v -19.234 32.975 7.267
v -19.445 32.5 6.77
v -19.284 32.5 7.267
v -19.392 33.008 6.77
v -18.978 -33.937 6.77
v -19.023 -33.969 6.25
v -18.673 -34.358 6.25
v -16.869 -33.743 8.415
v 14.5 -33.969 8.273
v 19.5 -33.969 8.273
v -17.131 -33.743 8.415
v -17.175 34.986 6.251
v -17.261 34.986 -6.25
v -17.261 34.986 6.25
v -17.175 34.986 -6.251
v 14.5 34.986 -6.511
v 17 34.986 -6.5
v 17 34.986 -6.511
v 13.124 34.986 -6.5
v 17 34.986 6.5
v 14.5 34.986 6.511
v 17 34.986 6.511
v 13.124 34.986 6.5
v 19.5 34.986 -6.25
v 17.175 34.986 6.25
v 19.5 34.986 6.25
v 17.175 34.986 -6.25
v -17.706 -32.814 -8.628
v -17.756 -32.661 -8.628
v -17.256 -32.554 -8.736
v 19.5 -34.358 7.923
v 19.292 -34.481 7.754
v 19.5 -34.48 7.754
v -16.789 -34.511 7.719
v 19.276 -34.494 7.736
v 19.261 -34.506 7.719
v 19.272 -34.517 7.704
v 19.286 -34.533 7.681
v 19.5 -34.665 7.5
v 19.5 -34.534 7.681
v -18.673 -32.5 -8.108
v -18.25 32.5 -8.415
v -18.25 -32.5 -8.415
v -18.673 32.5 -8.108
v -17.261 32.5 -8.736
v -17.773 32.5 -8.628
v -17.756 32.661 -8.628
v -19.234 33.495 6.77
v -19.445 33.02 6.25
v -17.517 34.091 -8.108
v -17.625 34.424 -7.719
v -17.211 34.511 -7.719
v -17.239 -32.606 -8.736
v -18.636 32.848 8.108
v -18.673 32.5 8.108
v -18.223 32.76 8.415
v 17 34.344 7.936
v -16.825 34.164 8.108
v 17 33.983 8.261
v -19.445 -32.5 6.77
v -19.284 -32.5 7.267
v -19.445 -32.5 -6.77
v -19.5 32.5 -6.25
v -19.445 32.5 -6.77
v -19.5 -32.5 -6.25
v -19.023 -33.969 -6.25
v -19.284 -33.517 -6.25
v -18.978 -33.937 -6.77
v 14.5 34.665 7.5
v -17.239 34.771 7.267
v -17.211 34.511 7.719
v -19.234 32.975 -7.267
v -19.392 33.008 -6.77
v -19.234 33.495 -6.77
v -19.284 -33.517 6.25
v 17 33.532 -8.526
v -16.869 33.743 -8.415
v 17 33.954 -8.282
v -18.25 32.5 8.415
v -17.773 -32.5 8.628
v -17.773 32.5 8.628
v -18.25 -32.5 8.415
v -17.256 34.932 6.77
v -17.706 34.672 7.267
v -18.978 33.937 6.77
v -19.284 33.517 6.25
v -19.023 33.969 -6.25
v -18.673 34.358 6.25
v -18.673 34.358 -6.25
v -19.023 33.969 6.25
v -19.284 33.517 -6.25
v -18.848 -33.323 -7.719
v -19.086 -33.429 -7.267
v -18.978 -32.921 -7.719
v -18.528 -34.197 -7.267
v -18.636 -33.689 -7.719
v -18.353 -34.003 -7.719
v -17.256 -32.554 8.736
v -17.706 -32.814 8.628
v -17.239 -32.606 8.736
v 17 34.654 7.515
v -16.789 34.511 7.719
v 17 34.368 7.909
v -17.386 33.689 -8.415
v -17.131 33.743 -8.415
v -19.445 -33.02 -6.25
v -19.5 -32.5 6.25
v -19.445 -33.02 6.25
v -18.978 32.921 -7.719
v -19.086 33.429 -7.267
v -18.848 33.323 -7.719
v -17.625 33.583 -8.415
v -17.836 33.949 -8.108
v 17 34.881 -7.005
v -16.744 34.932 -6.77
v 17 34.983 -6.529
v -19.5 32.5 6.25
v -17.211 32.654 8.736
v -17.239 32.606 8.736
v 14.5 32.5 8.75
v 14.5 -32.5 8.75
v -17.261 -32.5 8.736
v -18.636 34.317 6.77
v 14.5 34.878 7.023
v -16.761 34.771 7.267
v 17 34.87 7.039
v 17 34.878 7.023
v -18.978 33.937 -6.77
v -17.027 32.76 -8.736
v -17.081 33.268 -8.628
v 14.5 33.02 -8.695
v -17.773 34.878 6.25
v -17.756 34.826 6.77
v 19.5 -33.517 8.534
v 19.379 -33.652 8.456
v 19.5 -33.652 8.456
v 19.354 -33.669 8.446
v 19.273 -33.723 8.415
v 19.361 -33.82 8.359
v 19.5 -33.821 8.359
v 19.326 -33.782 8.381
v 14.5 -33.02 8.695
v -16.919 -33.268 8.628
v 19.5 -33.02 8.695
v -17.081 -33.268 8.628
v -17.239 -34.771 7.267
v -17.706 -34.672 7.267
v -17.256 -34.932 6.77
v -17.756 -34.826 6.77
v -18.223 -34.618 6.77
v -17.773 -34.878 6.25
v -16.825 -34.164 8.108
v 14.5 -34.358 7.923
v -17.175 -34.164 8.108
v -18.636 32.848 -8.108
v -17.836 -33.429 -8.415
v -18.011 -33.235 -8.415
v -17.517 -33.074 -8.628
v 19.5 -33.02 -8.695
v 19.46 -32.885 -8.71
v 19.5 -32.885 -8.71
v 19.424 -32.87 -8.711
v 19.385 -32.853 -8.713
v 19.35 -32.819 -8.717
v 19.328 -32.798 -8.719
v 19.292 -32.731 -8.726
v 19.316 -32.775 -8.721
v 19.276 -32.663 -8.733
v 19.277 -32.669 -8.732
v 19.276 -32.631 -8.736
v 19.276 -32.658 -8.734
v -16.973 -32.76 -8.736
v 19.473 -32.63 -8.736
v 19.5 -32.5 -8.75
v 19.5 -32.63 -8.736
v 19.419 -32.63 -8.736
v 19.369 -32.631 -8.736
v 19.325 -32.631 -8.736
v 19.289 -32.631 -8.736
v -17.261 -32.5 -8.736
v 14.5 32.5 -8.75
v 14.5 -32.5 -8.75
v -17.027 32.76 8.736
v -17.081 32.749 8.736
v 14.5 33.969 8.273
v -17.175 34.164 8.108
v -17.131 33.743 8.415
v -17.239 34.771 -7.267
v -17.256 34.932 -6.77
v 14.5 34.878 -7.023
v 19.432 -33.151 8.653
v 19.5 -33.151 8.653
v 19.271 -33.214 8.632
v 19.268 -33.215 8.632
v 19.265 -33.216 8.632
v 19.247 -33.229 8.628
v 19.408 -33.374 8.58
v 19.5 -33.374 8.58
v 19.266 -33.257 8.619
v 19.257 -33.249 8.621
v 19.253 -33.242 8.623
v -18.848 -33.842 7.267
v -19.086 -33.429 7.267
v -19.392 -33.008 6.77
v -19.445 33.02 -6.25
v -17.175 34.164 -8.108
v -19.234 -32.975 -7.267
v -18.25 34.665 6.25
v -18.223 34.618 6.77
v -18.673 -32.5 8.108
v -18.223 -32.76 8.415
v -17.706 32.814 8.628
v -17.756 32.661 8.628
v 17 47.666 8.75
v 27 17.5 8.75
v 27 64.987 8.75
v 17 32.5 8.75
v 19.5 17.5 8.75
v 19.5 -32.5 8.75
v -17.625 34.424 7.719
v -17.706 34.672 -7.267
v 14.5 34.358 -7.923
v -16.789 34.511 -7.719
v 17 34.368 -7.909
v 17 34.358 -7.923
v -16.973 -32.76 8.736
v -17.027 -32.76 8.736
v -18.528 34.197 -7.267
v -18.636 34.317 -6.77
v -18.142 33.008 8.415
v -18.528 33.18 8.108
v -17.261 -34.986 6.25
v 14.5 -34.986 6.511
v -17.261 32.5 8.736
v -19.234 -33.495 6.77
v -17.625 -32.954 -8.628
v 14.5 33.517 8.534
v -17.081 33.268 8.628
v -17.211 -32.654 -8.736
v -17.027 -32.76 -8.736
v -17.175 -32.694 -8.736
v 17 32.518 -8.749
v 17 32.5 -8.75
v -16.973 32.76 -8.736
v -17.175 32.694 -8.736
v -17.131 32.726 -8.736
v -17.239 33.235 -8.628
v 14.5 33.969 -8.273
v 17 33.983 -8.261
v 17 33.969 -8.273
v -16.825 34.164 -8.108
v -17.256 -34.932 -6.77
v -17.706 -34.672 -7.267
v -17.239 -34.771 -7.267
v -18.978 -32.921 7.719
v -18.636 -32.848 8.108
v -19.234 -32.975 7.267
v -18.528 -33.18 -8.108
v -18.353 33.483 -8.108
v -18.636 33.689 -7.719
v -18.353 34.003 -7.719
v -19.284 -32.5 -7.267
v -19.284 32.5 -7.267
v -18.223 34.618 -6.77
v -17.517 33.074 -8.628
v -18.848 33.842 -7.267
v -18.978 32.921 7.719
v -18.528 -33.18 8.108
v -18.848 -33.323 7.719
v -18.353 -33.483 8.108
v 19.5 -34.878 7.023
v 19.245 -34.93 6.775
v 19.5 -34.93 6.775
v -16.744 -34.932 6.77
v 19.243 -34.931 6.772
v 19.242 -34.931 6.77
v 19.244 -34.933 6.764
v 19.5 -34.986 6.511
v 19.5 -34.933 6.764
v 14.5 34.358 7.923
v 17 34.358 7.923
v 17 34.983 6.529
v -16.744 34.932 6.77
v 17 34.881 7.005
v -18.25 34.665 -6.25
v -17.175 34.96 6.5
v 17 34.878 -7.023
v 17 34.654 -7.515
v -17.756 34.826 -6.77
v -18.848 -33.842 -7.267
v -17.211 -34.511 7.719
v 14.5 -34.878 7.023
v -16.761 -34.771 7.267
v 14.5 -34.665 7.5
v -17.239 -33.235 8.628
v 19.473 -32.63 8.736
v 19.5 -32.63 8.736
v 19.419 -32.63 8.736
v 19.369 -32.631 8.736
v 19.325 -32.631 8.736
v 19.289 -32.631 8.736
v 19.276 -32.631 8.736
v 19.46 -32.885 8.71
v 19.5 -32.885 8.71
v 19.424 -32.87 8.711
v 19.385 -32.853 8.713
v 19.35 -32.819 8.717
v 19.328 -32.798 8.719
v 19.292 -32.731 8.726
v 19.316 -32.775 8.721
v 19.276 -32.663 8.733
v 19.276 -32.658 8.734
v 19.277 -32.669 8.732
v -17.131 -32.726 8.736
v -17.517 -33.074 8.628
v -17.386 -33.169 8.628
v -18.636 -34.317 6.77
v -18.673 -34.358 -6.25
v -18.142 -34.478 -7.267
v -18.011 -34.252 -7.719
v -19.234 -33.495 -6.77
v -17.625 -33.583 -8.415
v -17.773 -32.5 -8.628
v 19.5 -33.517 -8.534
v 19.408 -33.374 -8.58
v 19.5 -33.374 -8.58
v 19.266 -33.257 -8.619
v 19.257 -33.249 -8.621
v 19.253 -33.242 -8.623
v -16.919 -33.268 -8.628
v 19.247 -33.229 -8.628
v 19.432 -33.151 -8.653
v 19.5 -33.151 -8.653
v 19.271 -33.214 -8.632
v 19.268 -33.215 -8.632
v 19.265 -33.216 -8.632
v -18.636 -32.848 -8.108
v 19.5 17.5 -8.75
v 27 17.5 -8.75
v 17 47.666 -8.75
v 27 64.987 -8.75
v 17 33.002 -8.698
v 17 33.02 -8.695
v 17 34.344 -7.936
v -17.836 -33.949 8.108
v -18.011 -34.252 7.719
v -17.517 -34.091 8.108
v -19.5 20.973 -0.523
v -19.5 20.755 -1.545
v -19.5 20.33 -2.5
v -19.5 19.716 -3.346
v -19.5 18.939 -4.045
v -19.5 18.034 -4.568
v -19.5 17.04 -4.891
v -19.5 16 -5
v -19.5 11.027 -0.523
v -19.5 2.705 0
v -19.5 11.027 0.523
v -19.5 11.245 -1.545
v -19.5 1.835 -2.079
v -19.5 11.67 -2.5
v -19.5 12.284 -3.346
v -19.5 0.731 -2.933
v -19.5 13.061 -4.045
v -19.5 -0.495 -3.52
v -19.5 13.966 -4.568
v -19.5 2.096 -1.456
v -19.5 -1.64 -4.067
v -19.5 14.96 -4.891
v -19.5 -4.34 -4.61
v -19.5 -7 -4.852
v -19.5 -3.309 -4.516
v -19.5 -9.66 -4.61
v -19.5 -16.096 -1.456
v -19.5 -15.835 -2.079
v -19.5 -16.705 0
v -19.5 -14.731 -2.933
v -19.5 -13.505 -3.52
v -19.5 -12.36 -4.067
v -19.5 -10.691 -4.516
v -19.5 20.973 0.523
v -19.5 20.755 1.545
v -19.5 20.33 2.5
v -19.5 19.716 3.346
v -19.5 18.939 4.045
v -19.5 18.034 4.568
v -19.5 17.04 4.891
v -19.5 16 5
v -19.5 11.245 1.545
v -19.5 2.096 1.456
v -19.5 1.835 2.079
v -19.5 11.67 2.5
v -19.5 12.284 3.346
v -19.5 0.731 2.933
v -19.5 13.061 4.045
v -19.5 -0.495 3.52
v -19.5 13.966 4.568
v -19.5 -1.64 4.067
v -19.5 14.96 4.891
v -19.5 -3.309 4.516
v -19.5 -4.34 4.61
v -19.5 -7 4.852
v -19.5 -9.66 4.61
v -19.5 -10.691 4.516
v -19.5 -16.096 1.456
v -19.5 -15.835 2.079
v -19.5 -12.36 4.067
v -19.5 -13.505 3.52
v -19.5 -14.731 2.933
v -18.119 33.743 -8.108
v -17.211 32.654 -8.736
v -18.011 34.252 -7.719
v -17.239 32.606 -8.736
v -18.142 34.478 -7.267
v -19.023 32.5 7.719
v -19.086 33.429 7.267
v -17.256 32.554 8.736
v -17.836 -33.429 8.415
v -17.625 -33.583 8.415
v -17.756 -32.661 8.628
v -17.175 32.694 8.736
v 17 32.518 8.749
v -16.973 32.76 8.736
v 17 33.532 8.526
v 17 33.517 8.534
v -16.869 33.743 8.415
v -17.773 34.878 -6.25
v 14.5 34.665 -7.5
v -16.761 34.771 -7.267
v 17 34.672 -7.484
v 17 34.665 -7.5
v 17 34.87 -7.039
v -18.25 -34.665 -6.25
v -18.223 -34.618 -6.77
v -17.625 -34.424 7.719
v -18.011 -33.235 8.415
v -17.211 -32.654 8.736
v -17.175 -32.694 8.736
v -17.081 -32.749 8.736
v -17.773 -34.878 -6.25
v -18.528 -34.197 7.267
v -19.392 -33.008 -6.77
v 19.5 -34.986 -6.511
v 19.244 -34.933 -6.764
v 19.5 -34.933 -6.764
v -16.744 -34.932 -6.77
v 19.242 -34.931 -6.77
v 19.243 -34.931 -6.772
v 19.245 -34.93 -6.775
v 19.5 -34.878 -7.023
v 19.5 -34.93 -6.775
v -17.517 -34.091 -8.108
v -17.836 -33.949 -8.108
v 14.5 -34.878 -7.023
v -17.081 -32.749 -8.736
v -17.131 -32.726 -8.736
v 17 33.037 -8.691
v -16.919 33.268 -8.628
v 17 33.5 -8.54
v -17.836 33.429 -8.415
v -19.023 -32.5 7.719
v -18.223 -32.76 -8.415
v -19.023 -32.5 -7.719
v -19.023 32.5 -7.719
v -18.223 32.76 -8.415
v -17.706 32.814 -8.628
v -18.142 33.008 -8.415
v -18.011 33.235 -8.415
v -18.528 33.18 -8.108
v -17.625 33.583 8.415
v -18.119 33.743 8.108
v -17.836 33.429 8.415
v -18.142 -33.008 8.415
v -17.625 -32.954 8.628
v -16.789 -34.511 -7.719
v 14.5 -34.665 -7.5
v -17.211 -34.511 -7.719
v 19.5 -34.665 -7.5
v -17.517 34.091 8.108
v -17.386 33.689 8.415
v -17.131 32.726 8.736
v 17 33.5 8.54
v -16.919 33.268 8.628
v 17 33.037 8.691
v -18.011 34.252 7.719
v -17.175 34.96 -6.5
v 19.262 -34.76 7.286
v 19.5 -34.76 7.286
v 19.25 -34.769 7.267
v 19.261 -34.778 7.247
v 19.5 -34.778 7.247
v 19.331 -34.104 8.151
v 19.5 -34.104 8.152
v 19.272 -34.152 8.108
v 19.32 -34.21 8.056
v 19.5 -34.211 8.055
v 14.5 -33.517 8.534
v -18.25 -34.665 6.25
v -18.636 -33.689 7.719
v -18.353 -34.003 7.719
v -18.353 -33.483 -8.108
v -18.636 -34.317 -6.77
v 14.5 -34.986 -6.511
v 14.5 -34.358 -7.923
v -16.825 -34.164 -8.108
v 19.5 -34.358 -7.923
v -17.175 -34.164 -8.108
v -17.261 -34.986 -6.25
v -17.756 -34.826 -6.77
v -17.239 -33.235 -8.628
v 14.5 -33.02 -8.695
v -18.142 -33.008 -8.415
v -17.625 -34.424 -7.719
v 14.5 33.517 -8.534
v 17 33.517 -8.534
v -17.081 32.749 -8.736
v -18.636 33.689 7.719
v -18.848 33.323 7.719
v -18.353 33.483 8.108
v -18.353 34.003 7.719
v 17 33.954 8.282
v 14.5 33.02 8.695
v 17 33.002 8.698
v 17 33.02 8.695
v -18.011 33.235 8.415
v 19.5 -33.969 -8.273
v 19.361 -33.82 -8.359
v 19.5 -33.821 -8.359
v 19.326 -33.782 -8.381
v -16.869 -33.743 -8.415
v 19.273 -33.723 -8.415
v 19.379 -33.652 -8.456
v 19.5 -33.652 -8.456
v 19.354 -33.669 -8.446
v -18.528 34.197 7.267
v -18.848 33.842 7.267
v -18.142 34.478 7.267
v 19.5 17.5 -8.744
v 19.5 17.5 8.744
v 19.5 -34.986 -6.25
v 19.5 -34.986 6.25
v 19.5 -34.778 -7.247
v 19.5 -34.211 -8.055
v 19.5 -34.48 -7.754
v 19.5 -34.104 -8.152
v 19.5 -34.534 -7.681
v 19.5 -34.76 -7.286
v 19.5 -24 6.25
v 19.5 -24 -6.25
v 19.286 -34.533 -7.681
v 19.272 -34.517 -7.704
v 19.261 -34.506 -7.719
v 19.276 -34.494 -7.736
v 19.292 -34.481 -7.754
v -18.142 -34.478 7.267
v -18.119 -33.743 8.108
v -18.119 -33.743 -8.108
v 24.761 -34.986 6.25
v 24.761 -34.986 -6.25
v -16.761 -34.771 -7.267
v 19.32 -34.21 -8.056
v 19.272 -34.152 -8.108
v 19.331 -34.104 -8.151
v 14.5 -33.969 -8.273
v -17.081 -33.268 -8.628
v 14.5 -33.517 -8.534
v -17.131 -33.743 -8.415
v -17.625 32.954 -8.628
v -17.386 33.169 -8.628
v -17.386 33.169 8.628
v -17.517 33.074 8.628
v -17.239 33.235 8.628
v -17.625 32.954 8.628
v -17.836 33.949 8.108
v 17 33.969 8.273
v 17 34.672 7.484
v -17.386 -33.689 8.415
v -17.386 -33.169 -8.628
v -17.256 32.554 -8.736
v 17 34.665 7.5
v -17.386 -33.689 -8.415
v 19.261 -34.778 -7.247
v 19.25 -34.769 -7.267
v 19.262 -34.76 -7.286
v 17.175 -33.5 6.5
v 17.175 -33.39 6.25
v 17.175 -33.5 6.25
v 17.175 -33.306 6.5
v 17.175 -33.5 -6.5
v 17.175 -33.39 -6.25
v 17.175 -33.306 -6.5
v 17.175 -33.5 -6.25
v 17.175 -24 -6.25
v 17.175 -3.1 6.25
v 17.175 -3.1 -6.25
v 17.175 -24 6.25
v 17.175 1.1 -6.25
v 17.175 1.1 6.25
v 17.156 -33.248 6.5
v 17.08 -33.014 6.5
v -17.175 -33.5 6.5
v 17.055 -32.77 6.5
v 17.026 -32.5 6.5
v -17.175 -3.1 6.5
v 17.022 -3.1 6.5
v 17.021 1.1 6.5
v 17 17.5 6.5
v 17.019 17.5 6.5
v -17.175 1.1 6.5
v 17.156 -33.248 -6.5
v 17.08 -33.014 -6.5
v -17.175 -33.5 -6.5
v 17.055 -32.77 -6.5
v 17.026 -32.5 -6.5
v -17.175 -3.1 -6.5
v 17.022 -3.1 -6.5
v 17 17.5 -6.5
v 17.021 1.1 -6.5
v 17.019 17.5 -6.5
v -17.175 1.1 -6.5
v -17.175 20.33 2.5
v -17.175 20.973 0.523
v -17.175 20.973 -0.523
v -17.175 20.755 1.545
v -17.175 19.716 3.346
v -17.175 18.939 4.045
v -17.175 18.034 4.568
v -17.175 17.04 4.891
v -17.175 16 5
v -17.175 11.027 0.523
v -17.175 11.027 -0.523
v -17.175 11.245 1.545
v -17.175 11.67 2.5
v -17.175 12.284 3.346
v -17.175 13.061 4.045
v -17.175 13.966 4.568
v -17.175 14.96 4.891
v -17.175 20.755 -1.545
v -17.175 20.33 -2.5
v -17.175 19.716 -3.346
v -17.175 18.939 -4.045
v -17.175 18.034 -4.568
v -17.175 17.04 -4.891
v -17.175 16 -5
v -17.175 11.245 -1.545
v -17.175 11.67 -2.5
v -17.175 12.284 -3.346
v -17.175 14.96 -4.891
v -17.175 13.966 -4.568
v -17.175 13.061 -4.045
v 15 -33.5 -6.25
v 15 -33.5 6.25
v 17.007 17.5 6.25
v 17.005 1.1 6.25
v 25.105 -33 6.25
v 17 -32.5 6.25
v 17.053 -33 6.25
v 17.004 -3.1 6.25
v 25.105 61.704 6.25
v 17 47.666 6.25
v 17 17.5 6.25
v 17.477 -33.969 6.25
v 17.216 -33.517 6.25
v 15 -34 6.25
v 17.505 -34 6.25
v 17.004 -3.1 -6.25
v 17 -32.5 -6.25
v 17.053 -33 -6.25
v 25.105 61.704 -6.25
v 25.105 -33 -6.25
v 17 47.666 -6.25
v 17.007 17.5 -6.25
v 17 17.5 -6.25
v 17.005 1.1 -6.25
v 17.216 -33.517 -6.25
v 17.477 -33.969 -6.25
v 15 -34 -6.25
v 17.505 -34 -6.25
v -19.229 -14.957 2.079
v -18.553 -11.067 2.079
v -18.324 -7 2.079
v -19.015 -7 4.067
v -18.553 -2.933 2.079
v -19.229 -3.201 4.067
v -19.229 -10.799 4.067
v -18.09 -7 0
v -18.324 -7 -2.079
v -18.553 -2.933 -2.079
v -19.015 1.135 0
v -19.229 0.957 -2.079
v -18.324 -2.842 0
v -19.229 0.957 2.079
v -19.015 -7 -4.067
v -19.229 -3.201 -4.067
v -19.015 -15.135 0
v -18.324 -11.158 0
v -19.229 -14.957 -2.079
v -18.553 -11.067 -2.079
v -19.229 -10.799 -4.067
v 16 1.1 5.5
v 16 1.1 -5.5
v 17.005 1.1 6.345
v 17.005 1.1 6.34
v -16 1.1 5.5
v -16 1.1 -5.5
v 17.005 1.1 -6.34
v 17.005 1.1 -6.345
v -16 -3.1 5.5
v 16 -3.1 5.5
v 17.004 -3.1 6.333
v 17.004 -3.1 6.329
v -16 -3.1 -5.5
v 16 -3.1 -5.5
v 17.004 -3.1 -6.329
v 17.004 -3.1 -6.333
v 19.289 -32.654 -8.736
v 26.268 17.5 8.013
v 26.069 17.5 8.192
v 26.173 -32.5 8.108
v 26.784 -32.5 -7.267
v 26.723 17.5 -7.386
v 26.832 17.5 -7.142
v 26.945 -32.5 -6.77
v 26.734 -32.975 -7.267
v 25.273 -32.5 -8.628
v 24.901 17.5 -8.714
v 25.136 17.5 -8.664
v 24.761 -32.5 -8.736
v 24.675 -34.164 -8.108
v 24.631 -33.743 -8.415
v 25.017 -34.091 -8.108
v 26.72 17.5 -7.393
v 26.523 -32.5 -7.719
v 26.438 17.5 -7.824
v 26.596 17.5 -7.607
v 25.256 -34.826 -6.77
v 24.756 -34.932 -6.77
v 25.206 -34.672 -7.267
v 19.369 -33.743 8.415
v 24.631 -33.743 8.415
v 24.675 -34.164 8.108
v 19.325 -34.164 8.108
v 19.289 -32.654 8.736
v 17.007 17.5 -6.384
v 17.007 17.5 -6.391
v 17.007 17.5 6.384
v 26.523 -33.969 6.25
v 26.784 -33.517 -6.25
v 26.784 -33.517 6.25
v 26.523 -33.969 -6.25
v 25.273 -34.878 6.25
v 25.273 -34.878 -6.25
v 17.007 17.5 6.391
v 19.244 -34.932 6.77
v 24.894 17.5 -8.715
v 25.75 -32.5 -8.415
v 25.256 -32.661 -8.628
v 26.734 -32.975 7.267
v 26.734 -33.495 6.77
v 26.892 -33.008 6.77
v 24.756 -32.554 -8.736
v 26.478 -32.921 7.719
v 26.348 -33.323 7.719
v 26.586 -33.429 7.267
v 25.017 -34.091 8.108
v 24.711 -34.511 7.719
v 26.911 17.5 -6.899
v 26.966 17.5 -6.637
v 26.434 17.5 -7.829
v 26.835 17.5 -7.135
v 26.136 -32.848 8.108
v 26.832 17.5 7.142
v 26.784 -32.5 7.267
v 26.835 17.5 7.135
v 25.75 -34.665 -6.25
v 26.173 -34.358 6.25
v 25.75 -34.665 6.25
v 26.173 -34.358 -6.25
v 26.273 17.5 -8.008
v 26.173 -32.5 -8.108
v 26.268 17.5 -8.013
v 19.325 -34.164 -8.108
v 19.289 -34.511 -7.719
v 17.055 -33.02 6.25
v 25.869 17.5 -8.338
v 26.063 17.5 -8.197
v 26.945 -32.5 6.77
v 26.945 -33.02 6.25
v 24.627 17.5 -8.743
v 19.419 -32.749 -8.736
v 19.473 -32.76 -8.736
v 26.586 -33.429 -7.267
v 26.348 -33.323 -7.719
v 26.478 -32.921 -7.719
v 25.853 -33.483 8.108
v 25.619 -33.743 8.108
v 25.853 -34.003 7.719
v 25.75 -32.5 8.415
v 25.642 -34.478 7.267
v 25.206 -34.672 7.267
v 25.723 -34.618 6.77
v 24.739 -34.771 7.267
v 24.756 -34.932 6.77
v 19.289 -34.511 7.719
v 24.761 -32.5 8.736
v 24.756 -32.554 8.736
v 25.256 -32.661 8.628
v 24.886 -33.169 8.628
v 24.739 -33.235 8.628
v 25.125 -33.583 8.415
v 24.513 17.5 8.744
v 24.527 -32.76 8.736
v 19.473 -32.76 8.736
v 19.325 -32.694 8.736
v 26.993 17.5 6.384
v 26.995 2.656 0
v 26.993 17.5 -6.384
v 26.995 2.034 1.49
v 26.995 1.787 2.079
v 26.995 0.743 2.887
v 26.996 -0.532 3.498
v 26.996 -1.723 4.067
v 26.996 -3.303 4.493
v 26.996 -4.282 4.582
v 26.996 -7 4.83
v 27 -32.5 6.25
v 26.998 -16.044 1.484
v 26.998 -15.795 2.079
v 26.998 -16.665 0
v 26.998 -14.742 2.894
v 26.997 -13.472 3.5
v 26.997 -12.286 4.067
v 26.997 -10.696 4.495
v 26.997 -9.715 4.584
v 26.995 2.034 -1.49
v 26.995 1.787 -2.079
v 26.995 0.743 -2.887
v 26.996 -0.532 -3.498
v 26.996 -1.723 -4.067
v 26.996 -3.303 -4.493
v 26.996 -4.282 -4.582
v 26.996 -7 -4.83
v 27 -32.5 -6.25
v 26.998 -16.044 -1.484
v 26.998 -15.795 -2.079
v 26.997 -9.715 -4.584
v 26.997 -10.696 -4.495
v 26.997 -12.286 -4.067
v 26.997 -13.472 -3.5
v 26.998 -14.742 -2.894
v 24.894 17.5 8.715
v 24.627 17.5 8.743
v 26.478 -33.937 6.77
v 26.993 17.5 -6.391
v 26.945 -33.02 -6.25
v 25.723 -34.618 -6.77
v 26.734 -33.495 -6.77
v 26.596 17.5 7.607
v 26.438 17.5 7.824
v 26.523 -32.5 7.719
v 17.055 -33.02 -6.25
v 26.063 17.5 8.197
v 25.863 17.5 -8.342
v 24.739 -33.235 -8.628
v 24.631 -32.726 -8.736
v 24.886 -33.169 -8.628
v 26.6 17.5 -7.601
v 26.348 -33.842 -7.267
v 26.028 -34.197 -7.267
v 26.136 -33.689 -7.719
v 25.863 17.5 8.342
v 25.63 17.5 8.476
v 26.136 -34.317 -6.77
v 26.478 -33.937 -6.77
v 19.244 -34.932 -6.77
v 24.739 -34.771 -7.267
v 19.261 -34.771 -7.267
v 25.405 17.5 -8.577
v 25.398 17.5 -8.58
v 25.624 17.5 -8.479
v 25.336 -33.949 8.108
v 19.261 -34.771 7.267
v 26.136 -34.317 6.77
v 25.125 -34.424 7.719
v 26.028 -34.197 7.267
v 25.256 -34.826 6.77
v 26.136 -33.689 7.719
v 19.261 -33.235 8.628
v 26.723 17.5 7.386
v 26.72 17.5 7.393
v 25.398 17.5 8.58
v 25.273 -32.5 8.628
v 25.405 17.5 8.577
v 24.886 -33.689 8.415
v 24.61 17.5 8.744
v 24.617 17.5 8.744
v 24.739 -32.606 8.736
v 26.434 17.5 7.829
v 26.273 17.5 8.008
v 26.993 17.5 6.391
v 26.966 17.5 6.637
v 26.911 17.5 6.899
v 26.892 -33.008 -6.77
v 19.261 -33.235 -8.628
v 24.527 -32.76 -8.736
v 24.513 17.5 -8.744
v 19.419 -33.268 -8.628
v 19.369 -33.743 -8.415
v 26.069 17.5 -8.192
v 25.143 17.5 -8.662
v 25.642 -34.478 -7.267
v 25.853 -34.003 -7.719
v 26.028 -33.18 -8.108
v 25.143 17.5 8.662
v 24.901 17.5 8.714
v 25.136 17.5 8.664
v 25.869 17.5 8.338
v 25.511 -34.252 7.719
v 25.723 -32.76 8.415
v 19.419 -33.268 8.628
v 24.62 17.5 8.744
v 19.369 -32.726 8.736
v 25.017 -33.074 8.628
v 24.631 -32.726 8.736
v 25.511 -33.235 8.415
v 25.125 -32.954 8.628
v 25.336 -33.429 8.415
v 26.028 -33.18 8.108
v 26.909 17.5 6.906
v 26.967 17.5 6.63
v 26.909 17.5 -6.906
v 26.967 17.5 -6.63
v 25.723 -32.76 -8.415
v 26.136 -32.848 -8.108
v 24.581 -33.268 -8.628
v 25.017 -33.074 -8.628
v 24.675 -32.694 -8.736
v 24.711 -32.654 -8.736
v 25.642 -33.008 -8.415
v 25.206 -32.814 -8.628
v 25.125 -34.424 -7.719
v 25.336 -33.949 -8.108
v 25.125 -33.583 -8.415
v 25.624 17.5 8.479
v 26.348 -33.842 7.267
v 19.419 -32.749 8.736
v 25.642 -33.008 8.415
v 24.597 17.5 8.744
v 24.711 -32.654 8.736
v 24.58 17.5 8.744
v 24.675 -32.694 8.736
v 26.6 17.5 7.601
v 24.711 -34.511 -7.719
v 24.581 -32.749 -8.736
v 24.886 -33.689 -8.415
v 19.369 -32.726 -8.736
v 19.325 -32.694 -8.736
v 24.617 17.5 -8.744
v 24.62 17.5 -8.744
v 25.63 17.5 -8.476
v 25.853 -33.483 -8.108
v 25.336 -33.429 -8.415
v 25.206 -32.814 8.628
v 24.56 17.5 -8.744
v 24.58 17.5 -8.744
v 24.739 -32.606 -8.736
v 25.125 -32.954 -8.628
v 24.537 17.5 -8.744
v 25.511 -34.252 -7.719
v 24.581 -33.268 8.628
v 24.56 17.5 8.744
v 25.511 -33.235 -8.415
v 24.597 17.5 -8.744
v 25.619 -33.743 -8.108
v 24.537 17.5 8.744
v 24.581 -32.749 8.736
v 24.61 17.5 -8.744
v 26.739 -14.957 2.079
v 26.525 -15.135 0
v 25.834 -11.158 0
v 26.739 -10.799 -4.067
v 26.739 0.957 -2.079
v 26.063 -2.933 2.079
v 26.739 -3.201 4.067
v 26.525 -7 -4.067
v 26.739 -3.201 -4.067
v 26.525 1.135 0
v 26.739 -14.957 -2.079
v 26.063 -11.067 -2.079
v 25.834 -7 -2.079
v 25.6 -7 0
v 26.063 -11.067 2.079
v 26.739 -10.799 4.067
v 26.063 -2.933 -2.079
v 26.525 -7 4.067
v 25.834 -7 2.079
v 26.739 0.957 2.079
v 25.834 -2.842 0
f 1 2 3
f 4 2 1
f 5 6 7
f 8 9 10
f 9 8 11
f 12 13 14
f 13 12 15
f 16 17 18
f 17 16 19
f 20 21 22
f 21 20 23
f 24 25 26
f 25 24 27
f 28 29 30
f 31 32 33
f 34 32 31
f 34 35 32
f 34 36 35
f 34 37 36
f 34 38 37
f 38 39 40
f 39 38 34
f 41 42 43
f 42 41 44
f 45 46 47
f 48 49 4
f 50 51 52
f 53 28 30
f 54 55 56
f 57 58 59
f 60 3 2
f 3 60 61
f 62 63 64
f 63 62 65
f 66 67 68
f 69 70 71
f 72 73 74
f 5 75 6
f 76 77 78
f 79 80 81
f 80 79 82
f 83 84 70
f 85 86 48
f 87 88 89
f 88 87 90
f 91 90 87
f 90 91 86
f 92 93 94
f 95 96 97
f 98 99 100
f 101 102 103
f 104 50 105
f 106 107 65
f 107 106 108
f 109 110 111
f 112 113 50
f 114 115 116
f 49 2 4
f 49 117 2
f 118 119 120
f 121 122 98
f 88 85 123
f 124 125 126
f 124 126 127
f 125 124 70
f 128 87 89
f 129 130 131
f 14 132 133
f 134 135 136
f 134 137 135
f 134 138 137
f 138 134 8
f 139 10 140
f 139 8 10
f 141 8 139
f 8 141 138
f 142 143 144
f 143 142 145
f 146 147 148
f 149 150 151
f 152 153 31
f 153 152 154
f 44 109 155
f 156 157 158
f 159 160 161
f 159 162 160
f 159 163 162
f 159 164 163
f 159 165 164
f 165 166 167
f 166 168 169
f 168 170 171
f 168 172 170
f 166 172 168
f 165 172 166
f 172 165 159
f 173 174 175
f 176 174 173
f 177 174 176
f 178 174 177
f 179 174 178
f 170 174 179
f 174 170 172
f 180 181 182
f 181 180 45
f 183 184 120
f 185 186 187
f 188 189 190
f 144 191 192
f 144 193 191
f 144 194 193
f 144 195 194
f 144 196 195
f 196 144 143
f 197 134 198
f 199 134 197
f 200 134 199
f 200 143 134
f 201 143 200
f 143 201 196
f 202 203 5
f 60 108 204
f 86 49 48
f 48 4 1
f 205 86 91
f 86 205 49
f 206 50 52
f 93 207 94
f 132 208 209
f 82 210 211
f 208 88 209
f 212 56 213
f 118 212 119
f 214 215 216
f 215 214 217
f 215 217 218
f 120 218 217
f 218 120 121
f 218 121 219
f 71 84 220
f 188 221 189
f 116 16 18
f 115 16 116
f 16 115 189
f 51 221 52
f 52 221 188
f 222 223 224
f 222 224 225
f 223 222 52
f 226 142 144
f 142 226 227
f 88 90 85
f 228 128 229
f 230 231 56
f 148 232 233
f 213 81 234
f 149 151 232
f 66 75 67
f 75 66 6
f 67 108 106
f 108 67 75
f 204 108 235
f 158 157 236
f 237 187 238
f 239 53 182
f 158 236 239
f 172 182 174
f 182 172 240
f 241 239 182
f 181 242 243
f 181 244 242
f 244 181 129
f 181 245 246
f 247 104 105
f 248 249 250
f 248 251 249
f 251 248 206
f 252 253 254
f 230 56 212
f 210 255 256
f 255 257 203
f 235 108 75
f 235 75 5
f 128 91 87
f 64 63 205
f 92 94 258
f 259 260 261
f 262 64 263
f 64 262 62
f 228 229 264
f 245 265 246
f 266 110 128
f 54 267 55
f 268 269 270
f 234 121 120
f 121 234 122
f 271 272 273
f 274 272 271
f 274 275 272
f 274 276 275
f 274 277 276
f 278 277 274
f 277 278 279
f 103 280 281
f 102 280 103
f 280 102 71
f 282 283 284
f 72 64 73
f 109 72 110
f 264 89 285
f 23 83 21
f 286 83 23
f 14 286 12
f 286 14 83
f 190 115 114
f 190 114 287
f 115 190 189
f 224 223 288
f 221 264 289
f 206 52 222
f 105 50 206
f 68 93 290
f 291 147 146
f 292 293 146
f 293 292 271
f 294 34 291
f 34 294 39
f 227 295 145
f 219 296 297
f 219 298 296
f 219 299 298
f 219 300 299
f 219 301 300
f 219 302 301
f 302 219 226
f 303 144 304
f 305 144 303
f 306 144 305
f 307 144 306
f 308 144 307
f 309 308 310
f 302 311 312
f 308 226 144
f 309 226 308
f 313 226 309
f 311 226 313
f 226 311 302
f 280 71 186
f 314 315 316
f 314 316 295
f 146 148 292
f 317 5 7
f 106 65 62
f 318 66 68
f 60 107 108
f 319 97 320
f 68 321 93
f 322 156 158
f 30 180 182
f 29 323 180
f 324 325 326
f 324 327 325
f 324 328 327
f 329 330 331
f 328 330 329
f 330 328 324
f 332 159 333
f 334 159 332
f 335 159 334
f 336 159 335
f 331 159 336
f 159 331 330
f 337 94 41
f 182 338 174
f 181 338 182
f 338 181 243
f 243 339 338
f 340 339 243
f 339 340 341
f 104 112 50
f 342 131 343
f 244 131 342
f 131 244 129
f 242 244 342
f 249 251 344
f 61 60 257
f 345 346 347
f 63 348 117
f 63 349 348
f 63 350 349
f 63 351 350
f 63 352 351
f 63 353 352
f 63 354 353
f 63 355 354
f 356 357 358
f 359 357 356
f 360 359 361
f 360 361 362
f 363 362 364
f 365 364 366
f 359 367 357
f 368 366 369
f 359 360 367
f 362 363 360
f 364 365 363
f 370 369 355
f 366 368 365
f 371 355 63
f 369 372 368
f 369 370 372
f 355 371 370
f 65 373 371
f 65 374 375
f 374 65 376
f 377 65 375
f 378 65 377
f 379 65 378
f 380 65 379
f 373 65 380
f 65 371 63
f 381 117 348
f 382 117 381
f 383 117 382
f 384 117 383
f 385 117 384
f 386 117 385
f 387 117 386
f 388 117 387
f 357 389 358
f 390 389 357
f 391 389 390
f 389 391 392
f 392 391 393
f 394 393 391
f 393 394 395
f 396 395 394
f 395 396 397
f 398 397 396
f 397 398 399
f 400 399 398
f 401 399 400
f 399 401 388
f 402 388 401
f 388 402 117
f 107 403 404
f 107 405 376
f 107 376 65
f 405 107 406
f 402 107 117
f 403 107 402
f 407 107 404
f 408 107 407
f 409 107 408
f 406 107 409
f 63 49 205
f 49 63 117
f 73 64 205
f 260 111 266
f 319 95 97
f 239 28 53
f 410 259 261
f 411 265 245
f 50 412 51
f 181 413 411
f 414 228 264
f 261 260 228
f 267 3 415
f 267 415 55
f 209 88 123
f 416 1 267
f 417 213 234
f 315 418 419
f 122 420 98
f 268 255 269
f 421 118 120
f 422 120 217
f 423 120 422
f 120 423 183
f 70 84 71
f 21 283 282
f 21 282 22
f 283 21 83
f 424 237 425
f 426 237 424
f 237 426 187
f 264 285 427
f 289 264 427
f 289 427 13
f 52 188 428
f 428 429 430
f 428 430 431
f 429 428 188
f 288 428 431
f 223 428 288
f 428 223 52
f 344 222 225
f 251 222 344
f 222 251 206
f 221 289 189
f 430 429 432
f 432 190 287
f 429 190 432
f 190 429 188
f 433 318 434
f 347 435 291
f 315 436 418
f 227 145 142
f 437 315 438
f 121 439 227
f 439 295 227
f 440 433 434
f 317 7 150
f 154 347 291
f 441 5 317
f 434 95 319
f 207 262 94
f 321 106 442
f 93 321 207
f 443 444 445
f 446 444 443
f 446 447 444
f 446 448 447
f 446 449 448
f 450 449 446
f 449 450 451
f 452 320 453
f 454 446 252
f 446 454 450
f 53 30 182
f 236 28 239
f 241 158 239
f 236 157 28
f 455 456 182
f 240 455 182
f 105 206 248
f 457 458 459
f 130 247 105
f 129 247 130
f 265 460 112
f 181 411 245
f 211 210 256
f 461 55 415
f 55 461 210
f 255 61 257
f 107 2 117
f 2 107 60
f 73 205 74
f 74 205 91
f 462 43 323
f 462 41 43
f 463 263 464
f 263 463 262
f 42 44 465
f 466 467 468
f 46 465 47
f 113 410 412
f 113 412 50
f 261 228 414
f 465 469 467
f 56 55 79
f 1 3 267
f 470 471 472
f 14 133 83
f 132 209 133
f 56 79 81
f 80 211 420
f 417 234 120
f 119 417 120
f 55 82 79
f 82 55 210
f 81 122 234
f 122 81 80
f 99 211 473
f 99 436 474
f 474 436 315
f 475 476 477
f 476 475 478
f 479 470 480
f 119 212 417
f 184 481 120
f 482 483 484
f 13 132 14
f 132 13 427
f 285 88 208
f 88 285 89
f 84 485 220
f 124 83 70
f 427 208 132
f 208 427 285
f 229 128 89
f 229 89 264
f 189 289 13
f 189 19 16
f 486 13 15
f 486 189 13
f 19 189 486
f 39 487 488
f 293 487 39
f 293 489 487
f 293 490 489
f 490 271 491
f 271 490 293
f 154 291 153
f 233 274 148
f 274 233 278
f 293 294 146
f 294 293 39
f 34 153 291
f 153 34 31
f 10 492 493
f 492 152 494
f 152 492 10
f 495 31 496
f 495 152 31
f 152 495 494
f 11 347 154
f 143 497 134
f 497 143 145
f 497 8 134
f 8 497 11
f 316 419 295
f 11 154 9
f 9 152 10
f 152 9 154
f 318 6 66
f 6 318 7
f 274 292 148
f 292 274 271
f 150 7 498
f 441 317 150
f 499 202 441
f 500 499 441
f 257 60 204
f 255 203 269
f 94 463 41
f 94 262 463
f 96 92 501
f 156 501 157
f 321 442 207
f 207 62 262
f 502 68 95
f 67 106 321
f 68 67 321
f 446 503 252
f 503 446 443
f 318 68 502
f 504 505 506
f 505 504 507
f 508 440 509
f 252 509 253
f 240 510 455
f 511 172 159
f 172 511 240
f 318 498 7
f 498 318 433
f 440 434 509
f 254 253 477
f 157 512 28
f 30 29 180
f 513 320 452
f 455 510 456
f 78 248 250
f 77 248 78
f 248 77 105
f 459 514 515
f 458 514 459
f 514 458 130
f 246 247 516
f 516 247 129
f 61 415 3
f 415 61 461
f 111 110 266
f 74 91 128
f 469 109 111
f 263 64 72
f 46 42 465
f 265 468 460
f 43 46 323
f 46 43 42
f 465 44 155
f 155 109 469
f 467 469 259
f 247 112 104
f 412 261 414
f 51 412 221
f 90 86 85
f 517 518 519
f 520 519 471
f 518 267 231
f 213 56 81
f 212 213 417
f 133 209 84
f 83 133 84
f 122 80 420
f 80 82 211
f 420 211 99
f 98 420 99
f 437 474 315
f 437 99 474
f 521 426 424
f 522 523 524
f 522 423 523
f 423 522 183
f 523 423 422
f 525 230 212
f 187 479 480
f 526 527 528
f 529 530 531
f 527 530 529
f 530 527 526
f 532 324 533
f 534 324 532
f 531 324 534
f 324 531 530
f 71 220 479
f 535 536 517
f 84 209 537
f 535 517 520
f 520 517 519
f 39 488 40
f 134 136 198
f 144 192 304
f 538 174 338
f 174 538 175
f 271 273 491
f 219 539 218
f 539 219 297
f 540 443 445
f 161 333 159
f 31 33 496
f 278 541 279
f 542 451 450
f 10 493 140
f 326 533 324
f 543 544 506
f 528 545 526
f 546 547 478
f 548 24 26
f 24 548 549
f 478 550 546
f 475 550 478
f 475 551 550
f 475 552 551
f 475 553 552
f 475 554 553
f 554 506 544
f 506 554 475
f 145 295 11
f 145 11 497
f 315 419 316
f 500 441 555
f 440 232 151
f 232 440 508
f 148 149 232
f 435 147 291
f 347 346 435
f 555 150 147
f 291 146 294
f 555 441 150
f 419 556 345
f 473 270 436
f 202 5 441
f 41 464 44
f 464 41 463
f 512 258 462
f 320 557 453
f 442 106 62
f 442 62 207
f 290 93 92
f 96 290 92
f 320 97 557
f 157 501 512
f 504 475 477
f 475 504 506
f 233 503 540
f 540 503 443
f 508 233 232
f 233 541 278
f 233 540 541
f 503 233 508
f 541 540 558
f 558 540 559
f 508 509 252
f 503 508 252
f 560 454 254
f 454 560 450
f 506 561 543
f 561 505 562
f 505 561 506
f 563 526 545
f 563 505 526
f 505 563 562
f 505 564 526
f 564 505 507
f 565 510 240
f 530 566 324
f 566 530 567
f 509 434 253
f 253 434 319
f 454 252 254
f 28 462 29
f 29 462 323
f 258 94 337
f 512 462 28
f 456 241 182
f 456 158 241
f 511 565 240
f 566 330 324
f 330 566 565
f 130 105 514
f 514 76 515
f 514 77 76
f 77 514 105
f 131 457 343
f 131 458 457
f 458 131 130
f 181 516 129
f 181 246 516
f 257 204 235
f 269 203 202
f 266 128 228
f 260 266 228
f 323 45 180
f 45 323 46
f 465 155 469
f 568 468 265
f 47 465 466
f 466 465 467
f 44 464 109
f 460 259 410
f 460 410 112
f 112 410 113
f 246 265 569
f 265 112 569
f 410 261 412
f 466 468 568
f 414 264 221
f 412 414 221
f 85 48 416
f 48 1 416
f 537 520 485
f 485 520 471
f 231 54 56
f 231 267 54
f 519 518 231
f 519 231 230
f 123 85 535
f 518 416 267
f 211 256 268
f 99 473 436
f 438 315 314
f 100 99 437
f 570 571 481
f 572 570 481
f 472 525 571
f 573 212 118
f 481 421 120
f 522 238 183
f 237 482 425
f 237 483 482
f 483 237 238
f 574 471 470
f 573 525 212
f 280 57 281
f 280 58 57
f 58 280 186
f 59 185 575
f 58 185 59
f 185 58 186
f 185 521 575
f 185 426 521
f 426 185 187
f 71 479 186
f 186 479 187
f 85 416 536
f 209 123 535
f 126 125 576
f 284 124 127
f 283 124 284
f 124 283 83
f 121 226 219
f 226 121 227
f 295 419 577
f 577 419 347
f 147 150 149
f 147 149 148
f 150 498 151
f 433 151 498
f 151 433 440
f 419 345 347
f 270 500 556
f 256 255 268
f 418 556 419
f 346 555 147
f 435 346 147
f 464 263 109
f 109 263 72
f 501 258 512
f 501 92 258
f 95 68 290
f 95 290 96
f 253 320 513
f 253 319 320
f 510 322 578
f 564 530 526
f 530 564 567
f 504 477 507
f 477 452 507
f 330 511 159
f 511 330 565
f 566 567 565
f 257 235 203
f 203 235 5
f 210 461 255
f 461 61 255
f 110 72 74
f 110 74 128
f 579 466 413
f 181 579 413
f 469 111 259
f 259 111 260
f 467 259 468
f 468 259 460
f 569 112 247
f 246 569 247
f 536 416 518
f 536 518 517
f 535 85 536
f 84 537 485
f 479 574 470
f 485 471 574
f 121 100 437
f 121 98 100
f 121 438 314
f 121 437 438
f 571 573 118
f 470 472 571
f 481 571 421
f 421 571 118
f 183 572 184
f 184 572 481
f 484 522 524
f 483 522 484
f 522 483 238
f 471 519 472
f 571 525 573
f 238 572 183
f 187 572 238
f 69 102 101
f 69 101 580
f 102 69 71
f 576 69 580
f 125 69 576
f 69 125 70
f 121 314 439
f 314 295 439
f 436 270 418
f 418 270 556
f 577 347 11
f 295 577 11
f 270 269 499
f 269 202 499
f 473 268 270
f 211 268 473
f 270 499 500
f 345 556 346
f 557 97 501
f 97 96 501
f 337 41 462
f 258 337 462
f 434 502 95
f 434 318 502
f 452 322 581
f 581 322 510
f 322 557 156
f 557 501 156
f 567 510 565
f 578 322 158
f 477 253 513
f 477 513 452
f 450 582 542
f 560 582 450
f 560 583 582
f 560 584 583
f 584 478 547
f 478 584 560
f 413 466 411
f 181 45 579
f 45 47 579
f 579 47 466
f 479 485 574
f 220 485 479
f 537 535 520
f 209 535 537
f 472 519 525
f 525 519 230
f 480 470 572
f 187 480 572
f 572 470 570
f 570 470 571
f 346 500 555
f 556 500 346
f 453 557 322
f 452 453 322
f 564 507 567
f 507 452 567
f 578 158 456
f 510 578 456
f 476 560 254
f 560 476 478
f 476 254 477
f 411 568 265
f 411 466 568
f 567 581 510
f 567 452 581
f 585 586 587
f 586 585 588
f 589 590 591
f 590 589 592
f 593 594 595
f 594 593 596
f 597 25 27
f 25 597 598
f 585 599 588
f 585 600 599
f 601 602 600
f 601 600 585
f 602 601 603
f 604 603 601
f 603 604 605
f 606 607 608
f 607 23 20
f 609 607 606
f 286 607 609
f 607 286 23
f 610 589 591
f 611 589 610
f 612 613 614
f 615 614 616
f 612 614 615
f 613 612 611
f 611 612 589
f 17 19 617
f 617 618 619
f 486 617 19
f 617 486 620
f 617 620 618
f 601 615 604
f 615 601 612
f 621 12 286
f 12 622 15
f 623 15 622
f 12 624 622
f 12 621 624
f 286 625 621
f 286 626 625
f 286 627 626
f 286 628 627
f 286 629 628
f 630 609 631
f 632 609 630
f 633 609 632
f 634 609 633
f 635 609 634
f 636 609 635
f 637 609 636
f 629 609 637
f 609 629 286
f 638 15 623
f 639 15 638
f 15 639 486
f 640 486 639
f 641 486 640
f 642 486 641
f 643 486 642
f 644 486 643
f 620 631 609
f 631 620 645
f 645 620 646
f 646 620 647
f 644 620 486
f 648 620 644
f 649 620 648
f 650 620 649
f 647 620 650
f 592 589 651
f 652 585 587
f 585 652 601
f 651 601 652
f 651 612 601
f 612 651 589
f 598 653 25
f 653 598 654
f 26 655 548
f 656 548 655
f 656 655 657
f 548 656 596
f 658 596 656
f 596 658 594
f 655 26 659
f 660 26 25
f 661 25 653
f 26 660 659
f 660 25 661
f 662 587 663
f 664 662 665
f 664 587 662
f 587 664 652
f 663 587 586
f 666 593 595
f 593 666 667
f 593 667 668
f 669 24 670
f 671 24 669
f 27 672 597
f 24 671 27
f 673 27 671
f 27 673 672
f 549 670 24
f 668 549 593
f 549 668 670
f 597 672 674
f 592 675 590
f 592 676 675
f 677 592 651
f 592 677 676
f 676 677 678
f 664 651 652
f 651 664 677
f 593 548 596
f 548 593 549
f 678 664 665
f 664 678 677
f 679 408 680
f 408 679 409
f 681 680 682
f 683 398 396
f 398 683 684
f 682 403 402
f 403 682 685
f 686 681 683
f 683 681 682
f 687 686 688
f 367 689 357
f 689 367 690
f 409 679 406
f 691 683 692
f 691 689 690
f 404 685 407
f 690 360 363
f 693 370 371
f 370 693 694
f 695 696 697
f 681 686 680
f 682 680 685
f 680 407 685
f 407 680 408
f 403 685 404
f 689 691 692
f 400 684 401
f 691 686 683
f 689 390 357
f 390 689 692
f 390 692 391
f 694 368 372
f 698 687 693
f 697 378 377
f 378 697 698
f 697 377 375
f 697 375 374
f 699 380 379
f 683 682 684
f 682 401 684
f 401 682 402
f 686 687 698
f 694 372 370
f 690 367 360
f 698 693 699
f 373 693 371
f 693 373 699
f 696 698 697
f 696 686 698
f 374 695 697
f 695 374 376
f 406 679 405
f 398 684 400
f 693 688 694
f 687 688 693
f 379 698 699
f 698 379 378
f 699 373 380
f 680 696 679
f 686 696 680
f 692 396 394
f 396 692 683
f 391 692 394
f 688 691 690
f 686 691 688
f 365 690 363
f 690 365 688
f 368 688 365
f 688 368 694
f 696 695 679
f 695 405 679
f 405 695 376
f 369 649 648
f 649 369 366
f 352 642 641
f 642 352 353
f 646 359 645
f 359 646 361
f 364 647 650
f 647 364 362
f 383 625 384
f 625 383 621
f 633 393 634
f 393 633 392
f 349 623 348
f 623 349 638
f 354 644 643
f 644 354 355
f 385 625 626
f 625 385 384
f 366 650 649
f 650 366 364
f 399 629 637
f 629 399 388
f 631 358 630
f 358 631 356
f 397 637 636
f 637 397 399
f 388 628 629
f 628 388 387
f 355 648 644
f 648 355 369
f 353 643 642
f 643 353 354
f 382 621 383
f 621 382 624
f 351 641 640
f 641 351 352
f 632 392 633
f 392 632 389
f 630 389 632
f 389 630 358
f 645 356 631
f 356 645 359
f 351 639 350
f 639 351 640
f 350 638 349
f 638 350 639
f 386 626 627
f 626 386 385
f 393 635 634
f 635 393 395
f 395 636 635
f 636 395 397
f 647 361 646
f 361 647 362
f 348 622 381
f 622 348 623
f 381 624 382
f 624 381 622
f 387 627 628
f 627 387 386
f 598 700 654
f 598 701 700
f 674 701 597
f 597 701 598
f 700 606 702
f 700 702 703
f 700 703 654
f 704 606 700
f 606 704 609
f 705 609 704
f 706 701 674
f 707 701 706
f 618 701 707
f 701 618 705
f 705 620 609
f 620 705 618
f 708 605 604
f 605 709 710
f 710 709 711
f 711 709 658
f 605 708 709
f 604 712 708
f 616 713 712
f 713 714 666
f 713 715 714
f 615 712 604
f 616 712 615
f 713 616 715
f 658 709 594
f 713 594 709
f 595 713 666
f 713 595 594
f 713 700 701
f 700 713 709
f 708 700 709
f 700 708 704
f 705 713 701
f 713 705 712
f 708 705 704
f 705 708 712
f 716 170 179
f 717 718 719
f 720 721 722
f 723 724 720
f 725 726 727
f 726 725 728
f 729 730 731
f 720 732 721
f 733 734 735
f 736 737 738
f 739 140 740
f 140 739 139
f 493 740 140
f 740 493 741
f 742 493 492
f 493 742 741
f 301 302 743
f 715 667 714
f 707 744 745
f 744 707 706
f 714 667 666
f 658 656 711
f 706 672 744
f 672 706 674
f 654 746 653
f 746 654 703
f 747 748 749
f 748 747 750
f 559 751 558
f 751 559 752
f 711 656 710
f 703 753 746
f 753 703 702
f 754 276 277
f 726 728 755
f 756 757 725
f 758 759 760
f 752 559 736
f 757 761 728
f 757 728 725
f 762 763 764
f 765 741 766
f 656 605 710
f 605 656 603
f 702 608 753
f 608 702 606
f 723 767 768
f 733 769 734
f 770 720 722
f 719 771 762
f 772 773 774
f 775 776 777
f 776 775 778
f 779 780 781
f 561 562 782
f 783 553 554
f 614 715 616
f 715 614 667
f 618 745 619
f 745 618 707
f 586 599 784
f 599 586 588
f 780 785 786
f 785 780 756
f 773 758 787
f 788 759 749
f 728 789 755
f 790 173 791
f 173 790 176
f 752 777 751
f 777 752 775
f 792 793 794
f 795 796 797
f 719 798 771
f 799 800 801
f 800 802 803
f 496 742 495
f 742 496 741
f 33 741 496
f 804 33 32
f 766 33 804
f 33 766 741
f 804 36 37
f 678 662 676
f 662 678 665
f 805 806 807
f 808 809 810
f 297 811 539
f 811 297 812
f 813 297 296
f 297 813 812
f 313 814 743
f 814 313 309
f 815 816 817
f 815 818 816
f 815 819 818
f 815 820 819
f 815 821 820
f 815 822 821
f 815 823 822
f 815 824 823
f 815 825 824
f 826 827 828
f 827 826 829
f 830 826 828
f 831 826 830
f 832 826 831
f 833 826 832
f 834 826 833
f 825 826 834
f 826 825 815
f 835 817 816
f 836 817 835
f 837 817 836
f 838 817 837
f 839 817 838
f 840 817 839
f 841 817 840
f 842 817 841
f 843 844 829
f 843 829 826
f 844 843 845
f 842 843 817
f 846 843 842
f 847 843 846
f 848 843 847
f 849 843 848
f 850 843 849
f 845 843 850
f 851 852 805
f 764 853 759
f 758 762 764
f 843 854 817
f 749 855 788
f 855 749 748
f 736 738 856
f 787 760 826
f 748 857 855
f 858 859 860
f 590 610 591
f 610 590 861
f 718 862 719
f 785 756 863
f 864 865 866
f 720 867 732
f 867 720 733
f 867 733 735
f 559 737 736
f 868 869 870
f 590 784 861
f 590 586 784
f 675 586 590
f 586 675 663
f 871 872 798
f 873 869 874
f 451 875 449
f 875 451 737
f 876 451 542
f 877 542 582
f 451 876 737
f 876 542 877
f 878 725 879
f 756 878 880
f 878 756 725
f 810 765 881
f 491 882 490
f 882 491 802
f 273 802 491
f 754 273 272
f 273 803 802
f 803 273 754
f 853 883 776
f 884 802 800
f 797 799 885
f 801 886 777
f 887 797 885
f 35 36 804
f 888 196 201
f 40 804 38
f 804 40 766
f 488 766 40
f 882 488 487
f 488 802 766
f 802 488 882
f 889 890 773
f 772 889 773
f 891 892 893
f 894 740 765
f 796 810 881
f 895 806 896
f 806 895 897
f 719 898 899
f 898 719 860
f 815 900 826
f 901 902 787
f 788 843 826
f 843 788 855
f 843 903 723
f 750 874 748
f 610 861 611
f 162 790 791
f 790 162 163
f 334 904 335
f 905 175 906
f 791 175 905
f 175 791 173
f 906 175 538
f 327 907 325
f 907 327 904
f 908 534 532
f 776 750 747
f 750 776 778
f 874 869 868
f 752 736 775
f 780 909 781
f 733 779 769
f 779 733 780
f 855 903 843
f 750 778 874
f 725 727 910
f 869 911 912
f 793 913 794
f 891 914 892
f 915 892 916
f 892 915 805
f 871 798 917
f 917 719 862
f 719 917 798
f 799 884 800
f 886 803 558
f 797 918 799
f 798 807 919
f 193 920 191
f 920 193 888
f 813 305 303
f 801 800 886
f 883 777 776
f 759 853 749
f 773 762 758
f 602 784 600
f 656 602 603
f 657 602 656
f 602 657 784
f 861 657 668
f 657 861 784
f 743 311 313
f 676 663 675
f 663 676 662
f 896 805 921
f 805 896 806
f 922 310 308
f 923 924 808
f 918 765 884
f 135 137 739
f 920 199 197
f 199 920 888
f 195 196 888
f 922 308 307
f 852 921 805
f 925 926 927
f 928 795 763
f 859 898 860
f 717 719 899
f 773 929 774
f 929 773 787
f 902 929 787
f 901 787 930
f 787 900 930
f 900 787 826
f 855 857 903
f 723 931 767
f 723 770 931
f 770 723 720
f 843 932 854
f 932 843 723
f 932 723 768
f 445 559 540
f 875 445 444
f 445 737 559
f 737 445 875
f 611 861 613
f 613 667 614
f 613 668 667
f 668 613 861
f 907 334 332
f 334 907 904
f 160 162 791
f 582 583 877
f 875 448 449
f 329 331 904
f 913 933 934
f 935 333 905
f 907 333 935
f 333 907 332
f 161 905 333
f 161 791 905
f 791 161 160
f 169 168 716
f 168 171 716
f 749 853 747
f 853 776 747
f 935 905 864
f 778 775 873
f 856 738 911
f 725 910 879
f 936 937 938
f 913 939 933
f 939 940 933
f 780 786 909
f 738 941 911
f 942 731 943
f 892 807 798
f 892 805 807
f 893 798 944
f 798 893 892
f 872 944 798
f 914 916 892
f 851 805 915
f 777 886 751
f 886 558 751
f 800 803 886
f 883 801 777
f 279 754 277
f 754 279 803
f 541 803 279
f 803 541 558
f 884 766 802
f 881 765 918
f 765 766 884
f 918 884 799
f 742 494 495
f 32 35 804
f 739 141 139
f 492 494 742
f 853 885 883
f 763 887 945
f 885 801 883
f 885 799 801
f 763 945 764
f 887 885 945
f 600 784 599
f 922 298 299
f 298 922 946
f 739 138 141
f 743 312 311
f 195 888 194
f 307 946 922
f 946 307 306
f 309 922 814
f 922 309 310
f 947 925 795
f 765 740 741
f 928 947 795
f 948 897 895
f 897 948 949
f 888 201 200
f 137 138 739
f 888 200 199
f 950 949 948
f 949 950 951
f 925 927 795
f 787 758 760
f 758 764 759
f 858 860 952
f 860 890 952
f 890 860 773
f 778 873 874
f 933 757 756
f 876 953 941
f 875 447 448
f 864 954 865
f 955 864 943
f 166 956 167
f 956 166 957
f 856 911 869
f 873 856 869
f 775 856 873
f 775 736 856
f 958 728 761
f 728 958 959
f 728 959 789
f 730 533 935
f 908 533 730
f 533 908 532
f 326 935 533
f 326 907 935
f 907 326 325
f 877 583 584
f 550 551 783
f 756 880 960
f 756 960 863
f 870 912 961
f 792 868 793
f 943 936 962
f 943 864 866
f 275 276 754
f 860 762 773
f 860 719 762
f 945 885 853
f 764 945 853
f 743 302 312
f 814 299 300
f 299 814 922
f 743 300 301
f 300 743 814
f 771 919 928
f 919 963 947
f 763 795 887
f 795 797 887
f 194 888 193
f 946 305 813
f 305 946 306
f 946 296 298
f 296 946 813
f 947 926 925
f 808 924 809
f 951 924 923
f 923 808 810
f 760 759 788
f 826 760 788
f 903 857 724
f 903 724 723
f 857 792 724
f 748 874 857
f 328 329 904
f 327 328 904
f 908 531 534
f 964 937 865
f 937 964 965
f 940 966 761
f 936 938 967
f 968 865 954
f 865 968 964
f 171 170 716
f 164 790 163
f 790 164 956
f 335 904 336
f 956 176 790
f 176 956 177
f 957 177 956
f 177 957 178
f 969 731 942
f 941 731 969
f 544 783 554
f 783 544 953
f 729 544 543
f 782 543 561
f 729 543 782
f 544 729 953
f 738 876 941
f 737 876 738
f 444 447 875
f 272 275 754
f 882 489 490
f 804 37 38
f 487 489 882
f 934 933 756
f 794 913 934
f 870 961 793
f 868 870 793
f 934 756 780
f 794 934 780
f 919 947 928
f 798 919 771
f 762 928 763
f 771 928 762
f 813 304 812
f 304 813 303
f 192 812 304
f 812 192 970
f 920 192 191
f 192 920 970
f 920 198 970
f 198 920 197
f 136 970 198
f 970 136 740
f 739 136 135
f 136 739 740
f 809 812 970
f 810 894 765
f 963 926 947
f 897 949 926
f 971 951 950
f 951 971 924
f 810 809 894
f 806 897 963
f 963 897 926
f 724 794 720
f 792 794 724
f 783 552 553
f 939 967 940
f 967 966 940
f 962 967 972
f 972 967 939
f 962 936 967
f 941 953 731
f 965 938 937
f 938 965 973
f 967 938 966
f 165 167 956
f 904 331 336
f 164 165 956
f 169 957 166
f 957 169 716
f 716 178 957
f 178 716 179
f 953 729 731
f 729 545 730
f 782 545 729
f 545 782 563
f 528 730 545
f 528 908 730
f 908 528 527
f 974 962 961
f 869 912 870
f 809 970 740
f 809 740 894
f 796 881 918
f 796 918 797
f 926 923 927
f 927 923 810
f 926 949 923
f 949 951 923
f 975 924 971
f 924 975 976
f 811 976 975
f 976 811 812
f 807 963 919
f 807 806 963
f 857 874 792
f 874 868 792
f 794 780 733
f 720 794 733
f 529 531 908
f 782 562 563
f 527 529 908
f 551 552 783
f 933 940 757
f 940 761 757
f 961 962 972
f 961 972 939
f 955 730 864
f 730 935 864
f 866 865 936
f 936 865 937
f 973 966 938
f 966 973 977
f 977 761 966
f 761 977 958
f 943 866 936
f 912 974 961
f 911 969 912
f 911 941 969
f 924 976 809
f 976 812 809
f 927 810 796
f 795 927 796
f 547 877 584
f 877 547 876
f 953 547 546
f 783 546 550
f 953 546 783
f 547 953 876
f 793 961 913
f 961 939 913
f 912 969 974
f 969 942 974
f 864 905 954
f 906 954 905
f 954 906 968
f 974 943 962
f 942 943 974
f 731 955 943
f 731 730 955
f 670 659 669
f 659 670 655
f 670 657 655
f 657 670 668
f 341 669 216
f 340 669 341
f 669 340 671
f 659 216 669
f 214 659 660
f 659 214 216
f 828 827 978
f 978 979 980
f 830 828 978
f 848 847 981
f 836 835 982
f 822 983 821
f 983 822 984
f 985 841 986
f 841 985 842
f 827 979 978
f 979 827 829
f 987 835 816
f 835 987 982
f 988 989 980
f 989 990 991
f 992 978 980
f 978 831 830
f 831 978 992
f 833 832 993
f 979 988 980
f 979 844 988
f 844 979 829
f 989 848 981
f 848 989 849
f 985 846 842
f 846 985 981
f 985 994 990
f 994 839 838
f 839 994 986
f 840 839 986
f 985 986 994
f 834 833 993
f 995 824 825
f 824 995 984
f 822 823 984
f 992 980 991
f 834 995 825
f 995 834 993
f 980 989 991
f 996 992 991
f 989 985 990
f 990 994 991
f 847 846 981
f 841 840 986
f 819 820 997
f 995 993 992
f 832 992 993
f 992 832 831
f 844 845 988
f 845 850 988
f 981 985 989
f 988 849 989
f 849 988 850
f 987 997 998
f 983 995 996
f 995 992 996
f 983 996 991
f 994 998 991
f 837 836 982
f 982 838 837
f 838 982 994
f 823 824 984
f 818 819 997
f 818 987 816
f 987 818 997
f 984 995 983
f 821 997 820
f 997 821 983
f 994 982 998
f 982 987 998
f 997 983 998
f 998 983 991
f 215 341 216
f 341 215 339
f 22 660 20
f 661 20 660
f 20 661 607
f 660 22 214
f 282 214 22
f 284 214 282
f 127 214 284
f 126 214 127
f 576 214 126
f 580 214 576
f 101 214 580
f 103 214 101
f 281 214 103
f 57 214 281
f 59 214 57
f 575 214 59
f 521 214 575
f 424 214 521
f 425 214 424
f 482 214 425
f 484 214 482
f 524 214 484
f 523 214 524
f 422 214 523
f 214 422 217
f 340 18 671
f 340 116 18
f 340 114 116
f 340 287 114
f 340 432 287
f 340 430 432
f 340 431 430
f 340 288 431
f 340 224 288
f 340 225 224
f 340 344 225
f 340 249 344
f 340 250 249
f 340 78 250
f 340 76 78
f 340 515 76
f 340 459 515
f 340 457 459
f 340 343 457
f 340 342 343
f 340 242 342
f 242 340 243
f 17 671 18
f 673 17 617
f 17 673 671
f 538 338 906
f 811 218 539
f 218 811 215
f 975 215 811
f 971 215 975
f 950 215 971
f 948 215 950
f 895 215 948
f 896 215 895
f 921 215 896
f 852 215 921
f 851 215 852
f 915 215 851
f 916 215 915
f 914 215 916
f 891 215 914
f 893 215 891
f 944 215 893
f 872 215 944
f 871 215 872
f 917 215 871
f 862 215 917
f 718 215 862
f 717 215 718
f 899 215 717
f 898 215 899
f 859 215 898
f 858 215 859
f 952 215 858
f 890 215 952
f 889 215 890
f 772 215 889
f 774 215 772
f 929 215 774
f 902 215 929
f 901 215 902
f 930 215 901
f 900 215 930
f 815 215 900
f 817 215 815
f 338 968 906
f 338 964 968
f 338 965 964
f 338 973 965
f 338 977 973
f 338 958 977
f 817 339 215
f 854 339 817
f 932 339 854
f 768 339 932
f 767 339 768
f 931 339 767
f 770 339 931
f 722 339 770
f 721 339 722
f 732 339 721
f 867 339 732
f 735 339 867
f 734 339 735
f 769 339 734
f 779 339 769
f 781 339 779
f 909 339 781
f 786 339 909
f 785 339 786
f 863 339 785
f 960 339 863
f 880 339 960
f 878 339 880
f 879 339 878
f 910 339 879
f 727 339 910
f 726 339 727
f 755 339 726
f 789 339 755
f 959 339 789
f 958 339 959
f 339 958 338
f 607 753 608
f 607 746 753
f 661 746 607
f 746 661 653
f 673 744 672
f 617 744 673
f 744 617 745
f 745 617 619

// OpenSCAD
// Higher definition curves
$fs = 0.01;

module roundedcube(size = [1, 1, 1], center = false, radius = 0.5, apply_to = "all") {
	// If single value, convert to [x, y, z] vector
	size = (size[0] == undef) ? [size, size, size] : size;

	translate_min = radius;
	translate_xmax = size[0] - radius;
	translate_ymax = size[1] - radius;
	translate_zmax = size[2] - radius;

	diameter = radius * 2;

	module build_point(type = "sphere", rotate = [0, 0, 0]) {
		if (type == "sphere") {
			sphere(r = radius);
		} else if (type == "cylinder") {
			rotate(a = rotate)
			cylinder(h = diameter, r = radius, center = true);
		}
	}

	obj_translate = (center == false) ?
		[0, 0, 0] : [
			-(size[0] / 2),
			-(size[1] / 2),
			-(size[2] / 2)
		];

	translate(v = obj_translate) {
		hull() {
			for (translate_x = [translate_min, translate_xmax]) {
				x_at = (translate_x == translate_min) ? "min" : "max";
				for (translate_y = [translate_min, translate_ymax]) {
					y_at = (translate_y == translate_min) ? "min" : "max";
					for (translate_z = [translate_min, translate_zmax]) {
						z_at = (translate_z == translate_min) ? "min" : "max";

						translate(v = [translate_x, translate_y, translate_z])
						if (
							(apply_to == "all") ||
							(apply_to == "xmin" && x_at == "min") || (apply_to == "xmax" && x_at == "max") ||
							(apply_to == "ymin" && y_at == "min") || (apply_to == "ymax" && y_at == "max") ||
							(apply_to == "zmin" && z_at == "min") || (apply_to == "zmax" && z_at == "max")
						) {
							build_point("sphere");
						} else {
							rotate = 
								(apply_to == "xmin" || apply_to == "xmax" || apply_to == "x") ? [0, 90, 0] : (
								(apply_to == "ymin" || apply_to == "ymax" || apply_to == "y") ? [90, 90, 0] :
								[0, 0, 0]
							);
							build_point("cylinder", rotate);
						}
					}
				}
			}
		}
	}
}







difference() {
    roundedcube([39, 70, 17.5], center=true, apply_to="xmin", radius=2.5);
    
    translate([0, 9, 0])
        cube([34.35, 85, 13], center=true);
    
    translate([20, -29, 0])
              cube([10, 10, 12.5], center=true);
    
    translate([-28.79, -7, 0])
        scale([01.07,02,01])
            sphere(r=10);
    
    translate([-24, 16, 0])
        rotate([0, 90, 0])
            cylinder(20, r=5);
              
    
};

difference() {
    translate([0, -1, 0])
        cube([34.5, 4.2, 17], center=true);
    
    cube([32, 10, 11], center=true);

};
difference() {
    translate([22, 15, 0])
        roundedcube([10, 100, 17.5], center=true, radius=2.5, apply_to="ymin");

    translate([20.82, 17, 0])
        cube([8.57, 100, 12.5], center=true);
    
    translate([16.5, 46.8, -10])
        rotate([0, 0, 60])
        cube([40, 10 , 20]);
    
    translate([36.3, -7, 0])
        scale([0.107,0.2,0.1])
            sphere(r=100);

};

difference() {
    translate([22, 42.5, 0])
        cube([10, 50, 17.5], center=true);

    translate([20.82, 17, 0])
        cube([8.57, 100, 12.5], center=true);
    
    translate([16.5, 46.8, -10])
        rotate([0, 0, 60])
        cube([40, 10 , 20]);
    
    translate([36.62, 0, 0])
        scale([0.107,0.2,0.1])
            sphere(r=100);

};
